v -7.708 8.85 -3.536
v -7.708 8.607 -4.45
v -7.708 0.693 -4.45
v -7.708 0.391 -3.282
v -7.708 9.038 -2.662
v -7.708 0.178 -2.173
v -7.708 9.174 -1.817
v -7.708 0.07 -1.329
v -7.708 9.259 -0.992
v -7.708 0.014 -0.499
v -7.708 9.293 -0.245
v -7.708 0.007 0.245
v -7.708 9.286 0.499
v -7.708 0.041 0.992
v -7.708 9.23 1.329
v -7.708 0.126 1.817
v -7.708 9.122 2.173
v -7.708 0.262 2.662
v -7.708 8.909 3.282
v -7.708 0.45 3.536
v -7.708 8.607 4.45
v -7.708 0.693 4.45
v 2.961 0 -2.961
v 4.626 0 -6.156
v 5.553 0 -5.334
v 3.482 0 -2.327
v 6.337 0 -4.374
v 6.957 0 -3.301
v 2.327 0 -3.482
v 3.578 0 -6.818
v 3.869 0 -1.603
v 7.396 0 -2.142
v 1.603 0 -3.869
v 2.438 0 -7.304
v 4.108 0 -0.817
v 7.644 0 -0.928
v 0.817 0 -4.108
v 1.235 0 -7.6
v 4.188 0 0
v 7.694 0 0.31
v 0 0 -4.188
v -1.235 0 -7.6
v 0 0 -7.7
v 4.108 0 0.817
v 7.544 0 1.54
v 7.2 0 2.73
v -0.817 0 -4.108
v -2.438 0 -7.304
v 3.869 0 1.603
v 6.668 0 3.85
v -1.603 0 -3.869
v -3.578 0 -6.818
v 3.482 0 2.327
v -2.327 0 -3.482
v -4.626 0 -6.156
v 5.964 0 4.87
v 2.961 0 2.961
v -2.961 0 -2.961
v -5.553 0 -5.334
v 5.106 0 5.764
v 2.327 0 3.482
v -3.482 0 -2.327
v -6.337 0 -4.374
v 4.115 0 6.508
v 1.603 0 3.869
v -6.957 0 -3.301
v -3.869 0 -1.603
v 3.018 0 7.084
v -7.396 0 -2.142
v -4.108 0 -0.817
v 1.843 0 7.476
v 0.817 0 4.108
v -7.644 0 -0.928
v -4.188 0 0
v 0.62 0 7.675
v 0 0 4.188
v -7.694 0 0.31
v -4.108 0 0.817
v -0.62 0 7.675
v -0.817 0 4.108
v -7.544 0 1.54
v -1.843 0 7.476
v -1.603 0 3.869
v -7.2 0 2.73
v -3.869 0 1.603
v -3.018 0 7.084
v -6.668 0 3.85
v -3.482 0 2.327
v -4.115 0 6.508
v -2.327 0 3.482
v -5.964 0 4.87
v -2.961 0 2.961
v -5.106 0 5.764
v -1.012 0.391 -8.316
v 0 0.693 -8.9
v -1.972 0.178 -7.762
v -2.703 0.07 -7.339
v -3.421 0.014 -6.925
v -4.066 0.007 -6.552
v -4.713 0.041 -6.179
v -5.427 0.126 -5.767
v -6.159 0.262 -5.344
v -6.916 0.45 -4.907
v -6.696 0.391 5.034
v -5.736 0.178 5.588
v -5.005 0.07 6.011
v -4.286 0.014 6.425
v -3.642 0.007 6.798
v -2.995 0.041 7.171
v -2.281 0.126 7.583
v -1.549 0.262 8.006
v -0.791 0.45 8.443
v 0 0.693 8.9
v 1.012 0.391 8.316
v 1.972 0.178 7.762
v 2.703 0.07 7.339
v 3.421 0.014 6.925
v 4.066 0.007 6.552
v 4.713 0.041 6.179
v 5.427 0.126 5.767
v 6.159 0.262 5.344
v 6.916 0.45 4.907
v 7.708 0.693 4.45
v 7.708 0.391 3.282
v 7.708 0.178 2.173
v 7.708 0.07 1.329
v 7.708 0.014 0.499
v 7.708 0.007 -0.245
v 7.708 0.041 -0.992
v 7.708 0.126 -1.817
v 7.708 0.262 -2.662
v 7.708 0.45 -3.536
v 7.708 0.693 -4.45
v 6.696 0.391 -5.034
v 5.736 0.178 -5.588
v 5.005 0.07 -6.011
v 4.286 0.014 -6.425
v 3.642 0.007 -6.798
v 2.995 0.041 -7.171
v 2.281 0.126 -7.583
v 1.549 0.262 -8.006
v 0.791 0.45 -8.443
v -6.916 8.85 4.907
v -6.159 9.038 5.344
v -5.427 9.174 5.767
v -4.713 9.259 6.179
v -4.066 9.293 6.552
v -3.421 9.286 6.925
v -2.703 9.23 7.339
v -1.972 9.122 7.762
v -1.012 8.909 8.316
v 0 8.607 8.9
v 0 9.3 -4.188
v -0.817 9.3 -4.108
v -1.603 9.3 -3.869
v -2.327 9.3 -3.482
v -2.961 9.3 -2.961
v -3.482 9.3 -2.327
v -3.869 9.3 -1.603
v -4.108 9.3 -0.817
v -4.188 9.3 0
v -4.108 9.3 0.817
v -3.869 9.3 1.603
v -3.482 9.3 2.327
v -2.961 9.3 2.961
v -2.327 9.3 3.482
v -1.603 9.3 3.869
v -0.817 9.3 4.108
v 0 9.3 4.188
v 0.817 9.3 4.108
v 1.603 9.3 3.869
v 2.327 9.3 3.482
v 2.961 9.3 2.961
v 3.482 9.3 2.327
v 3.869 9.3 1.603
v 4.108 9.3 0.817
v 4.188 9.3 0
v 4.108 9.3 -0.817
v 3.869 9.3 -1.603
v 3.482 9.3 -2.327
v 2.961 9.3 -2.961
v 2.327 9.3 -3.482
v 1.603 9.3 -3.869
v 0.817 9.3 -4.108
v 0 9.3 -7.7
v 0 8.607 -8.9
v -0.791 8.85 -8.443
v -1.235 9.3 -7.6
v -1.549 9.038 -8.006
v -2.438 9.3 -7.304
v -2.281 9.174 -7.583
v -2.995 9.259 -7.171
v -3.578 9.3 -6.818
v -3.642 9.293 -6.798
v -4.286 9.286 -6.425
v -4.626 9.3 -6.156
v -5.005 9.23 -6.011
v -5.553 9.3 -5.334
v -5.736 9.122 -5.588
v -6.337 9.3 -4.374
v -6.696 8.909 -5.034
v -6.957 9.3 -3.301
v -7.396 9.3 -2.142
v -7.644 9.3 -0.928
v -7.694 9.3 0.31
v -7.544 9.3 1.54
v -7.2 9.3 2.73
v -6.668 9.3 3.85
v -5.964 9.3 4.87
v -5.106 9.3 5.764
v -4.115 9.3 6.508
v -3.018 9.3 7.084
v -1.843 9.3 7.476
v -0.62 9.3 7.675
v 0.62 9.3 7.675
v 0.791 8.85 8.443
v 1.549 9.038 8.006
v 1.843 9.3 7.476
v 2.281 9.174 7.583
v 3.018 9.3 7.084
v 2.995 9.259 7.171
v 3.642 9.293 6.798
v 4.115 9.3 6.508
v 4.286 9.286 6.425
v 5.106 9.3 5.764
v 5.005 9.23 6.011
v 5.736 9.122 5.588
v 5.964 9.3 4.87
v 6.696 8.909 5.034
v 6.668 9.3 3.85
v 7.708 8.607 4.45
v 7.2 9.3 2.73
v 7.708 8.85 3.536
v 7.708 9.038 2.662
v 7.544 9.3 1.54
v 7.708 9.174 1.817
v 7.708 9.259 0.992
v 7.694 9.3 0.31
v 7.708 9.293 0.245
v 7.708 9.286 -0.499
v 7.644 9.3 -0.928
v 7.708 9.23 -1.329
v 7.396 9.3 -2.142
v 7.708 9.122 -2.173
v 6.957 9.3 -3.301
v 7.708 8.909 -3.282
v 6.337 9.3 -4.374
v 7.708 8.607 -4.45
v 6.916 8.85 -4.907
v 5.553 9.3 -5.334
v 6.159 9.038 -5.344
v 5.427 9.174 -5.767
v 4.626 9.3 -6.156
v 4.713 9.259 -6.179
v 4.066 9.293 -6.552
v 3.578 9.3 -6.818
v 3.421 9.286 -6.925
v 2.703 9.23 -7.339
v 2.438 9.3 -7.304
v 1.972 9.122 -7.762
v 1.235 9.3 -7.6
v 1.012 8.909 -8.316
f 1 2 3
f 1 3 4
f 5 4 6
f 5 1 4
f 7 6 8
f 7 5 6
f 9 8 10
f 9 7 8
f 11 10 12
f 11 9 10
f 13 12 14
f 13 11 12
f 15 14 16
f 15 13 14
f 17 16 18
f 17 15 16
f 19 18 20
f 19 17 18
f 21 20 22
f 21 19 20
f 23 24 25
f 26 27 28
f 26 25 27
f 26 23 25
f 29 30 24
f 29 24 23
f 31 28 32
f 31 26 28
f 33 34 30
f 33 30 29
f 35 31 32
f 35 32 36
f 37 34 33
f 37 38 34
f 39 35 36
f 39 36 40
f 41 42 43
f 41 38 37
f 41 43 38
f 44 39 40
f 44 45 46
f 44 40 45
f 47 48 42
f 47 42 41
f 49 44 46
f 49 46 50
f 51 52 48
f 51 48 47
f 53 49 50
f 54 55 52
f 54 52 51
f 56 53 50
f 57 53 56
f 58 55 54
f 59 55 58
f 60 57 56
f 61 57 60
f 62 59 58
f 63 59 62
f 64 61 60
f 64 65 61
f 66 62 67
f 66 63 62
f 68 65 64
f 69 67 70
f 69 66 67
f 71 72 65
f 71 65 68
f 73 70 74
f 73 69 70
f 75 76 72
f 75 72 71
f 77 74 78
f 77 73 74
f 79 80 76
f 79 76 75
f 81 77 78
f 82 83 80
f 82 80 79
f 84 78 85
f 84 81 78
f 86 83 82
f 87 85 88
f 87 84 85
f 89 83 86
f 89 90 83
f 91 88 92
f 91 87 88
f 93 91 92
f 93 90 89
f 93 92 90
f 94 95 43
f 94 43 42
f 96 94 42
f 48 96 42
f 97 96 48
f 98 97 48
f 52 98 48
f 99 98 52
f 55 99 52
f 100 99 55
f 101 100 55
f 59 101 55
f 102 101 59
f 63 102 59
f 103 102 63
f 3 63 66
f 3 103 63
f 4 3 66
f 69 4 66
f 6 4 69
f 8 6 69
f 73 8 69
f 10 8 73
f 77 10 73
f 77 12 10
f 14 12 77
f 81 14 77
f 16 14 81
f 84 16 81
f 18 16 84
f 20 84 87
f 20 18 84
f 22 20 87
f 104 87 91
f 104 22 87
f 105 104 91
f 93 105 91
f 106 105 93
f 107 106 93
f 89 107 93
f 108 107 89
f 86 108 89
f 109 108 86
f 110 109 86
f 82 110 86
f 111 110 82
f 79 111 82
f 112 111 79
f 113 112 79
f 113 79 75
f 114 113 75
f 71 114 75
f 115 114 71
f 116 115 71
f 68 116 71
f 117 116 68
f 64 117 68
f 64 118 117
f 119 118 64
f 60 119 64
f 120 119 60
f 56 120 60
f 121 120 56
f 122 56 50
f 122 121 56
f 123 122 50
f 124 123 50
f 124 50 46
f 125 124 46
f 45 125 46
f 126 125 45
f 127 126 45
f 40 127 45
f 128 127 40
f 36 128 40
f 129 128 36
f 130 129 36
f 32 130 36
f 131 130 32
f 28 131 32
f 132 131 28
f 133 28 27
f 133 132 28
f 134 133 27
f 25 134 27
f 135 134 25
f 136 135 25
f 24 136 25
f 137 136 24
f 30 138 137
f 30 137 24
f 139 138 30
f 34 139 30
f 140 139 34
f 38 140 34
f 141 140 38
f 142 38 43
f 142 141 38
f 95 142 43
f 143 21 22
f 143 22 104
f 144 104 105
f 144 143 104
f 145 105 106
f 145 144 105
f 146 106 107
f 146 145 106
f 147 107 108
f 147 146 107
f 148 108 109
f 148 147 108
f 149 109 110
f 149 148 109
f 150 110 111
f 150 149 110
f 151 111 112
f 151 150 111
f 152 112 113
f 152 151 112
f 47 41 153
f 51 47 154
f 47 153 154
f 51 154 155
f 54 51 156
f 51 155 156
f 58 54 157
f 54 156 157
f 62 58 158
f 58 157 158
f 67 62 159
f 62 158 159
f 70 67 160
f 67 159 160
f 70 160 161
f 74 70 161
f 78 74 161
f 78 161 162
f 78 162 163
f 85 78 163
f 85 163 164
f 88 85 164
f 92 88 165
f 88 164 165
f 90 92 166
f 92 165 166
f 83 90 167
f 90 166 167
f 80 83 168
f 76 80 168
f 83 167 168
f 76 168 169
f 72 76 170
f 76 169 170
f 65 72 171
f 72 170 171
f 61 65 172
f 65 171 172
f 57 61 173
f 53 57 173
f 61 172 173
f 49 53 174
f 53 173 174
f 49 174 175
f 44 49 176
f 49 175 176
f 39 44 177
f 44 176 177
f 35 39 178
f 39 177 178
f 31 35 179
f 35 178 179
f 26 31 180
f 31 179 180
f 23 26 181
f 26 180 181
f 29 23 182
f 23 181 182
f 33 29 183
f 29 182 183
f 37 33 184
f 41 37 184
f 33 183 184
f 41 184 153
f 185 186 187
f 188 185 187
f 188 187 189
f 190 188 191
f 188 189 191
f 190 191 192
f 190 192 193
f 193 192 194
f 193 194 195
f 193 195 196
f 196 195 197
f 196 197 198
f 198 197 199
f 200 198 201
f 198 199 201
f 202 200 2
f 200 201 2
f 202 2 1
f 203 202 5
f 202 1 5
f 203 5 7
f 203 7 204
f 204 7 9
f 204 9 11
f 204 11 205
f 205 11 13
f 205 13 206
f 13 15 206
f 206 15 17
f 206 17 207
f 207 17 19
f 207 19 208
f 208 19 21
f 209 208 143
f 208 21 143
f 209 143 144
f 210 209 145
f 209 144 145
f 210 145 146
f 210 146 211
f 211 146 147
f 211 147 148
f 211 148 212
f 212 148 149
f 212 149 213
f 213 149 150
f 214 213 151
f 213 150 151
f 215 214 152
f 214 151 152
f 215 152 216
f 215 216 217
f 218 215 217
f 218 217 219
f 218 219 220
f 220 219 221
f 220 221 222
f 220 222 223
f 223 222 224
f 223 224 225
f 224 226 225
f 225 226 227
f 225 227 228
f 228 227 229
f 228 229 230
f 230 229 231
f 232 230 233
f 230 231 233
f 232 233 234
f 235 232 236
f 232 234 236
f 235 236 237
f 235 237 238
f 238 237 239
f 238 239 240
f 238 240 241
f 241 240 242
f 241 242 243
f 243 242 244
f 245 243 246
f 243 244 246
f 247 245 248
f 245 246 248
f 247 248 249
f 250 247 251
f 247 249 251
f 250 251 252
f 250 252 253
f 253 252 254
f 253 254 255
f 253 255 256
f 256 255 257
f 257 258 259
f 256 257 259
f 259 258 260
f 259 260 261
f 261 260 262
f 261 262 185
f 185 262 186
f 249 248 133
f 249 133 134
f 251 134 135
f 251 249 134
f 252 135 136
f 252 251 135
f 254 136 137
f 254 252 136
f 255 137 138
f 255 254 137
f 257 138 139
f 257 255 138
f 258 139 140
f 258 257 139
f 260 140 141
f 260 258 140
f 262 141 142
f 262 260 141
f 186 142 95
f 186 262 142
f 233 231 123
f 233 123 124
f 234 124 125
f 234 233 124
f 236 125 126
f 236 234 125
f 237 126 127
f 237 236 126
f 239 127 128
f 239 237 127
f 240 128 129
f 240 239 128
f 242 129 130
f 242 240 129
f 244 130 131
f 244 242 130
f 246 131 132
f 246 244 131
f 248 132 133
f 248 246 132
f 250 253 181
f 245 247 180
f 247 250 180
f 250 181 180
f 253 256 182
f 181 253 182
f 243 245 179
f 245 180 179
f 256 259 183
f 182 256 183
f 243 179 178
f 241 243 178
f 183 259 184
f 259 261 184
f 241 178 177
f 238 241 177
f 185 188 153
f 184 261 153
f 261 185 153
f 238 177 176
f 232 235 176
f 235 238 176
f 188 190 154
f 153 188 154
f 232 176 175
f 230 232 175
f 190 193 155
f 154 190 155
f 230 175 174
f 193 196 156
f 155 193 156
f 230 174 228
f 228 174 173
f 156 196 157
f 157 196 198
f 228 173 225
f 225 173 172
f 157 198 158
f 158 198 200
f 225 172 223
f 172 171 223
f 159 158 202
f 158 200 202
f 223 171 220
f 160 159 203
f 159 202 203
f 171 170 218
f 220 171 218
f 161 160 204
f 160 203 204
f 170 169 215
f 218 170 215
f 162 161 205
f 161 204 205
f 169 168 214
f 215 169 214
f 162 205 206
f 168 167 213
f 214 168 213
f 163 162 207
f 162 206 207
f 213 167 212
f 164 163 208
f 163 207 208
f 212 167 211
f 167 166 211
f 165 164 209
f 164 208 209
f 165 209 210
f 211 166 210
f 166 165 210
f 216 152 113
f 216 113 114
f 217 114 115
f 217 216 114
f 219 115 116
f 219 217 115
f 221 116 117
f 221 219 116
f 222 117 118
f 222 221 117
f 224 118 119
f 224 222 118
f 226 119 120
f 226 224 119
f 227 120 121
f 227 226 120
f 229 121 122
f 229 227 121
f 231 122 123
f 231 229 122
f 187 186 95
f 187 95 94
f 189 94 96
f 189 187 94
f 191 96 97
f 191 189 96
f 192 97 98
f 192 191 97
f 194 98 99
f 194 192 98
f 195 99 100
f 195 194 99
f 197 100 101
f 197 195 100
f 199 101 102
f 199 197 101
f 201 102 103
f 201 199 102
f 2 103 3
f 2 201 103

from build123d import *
from OCP.BRepFilletAPI import BRepFilletAPI_MakeChamfer

# Parameters (mm, degrees)
SZKIC1_W                   = 4.712
SZKIC1_H                   = 9.3
SFAZOWANIE1_SIZE           = 1.2
SFAZOWANIE1_SIZE2          = 0.692820323
SZKIC2_OUTSIDE_W           = 25.168
SZKIC2_OUTSIDE_H           = 25.168
WYTNIJ_WYCI_GNI_CIE1_DEPTH = 16.649600634


with BuildPart() as part:
    # Szkic1 → Obrót1 (revolve)
    with BuildSketch(Plane.XY, mode=Mode.PRIVATE) as obr_t1_sk:
        with Locations((6.544, 4.65)):
            Rectangle(SZKIC1_W, SZKIC1_H)
    revolve(obr_t1_sk.sketch.rotate(Axis((0, 0, 0), (0, 1, 0)), 90), axis=Axis((0, 0, 0), (0, 1, 0)))

    # Sfazowanie1: one chamfer whose edges measure the first distance from different faces: ONE call of the kernel's chamfer builder (chamfer() names one face for all edges)
    sfazowanie1_edges_1 = [part.edges().sort_by_distance(p)[0] for p in [
        (0, 0, 8.9),
    ]]
    sfazowanie1_side_1 = [part.faces().sort_by_distance(p)[0] for p in [
        (0, 0, 4.439730014),
    ]]
    sfazowanie1_edges_2 = [part.edges().sort_by_distance(p)[0] for p in [
        (0, 9.3, 8.9),
    ]]
    sfazowanie1_side_2 = [part.faces().sort_by_distance(p)[0] for p in [
        (0, 9.3, 8.648269986),
    ]]
    sfazowanie1 = BRepFilletAPI_MakeChamfer(part.part.solid().wrapped)
    for e in sfazowanie1_edges_1:
        sfazowanie1.Add(SFAZOWANIE1_SIZE, SFAZOWANIE1_SIZE2, e.wrapped, sfazowanie1_side_1[0].wrapped)  # the first distance lies on this face
    for e in sfazowanie1_edges_2:
        sfazowanie1.Add(SFAZOWANIE1_SIZE, SFAZOWANIE1_SIZE2, e.wrapped, sfazowanie1_side_2[0].wrapped)  # the first distance lies on this face
    add(Compound.cast(sfazowanie1.Shape()), mode=Mode.REPLACE)

    # Szkic2 outside → Wytnij-wyciągnięcie1 (cut, through all)
    with BuildSketch(Plane(origin=(0, 9.3, 0), x_dir=(1, 0, 0), z_dir=(0, 1, 0))):
        Rectangle(SZKIC2_OUTSIDE_W, SZKIC2_OUTSIDE_H)
        Polygon((7.707626094, 4.45), (0, 8.9), (-7.707626094, 4.45), (-7.707626094, -4.45), (0, -8.9), (7.707626094, -4.45), align=None, mode=Mode.SUBTRACT)
    extrude(amount=-WYTNIJ_WYCI_GNI_CIE1_DEPTH, mode=Mode.SUBTRACT)


solid = part.part
